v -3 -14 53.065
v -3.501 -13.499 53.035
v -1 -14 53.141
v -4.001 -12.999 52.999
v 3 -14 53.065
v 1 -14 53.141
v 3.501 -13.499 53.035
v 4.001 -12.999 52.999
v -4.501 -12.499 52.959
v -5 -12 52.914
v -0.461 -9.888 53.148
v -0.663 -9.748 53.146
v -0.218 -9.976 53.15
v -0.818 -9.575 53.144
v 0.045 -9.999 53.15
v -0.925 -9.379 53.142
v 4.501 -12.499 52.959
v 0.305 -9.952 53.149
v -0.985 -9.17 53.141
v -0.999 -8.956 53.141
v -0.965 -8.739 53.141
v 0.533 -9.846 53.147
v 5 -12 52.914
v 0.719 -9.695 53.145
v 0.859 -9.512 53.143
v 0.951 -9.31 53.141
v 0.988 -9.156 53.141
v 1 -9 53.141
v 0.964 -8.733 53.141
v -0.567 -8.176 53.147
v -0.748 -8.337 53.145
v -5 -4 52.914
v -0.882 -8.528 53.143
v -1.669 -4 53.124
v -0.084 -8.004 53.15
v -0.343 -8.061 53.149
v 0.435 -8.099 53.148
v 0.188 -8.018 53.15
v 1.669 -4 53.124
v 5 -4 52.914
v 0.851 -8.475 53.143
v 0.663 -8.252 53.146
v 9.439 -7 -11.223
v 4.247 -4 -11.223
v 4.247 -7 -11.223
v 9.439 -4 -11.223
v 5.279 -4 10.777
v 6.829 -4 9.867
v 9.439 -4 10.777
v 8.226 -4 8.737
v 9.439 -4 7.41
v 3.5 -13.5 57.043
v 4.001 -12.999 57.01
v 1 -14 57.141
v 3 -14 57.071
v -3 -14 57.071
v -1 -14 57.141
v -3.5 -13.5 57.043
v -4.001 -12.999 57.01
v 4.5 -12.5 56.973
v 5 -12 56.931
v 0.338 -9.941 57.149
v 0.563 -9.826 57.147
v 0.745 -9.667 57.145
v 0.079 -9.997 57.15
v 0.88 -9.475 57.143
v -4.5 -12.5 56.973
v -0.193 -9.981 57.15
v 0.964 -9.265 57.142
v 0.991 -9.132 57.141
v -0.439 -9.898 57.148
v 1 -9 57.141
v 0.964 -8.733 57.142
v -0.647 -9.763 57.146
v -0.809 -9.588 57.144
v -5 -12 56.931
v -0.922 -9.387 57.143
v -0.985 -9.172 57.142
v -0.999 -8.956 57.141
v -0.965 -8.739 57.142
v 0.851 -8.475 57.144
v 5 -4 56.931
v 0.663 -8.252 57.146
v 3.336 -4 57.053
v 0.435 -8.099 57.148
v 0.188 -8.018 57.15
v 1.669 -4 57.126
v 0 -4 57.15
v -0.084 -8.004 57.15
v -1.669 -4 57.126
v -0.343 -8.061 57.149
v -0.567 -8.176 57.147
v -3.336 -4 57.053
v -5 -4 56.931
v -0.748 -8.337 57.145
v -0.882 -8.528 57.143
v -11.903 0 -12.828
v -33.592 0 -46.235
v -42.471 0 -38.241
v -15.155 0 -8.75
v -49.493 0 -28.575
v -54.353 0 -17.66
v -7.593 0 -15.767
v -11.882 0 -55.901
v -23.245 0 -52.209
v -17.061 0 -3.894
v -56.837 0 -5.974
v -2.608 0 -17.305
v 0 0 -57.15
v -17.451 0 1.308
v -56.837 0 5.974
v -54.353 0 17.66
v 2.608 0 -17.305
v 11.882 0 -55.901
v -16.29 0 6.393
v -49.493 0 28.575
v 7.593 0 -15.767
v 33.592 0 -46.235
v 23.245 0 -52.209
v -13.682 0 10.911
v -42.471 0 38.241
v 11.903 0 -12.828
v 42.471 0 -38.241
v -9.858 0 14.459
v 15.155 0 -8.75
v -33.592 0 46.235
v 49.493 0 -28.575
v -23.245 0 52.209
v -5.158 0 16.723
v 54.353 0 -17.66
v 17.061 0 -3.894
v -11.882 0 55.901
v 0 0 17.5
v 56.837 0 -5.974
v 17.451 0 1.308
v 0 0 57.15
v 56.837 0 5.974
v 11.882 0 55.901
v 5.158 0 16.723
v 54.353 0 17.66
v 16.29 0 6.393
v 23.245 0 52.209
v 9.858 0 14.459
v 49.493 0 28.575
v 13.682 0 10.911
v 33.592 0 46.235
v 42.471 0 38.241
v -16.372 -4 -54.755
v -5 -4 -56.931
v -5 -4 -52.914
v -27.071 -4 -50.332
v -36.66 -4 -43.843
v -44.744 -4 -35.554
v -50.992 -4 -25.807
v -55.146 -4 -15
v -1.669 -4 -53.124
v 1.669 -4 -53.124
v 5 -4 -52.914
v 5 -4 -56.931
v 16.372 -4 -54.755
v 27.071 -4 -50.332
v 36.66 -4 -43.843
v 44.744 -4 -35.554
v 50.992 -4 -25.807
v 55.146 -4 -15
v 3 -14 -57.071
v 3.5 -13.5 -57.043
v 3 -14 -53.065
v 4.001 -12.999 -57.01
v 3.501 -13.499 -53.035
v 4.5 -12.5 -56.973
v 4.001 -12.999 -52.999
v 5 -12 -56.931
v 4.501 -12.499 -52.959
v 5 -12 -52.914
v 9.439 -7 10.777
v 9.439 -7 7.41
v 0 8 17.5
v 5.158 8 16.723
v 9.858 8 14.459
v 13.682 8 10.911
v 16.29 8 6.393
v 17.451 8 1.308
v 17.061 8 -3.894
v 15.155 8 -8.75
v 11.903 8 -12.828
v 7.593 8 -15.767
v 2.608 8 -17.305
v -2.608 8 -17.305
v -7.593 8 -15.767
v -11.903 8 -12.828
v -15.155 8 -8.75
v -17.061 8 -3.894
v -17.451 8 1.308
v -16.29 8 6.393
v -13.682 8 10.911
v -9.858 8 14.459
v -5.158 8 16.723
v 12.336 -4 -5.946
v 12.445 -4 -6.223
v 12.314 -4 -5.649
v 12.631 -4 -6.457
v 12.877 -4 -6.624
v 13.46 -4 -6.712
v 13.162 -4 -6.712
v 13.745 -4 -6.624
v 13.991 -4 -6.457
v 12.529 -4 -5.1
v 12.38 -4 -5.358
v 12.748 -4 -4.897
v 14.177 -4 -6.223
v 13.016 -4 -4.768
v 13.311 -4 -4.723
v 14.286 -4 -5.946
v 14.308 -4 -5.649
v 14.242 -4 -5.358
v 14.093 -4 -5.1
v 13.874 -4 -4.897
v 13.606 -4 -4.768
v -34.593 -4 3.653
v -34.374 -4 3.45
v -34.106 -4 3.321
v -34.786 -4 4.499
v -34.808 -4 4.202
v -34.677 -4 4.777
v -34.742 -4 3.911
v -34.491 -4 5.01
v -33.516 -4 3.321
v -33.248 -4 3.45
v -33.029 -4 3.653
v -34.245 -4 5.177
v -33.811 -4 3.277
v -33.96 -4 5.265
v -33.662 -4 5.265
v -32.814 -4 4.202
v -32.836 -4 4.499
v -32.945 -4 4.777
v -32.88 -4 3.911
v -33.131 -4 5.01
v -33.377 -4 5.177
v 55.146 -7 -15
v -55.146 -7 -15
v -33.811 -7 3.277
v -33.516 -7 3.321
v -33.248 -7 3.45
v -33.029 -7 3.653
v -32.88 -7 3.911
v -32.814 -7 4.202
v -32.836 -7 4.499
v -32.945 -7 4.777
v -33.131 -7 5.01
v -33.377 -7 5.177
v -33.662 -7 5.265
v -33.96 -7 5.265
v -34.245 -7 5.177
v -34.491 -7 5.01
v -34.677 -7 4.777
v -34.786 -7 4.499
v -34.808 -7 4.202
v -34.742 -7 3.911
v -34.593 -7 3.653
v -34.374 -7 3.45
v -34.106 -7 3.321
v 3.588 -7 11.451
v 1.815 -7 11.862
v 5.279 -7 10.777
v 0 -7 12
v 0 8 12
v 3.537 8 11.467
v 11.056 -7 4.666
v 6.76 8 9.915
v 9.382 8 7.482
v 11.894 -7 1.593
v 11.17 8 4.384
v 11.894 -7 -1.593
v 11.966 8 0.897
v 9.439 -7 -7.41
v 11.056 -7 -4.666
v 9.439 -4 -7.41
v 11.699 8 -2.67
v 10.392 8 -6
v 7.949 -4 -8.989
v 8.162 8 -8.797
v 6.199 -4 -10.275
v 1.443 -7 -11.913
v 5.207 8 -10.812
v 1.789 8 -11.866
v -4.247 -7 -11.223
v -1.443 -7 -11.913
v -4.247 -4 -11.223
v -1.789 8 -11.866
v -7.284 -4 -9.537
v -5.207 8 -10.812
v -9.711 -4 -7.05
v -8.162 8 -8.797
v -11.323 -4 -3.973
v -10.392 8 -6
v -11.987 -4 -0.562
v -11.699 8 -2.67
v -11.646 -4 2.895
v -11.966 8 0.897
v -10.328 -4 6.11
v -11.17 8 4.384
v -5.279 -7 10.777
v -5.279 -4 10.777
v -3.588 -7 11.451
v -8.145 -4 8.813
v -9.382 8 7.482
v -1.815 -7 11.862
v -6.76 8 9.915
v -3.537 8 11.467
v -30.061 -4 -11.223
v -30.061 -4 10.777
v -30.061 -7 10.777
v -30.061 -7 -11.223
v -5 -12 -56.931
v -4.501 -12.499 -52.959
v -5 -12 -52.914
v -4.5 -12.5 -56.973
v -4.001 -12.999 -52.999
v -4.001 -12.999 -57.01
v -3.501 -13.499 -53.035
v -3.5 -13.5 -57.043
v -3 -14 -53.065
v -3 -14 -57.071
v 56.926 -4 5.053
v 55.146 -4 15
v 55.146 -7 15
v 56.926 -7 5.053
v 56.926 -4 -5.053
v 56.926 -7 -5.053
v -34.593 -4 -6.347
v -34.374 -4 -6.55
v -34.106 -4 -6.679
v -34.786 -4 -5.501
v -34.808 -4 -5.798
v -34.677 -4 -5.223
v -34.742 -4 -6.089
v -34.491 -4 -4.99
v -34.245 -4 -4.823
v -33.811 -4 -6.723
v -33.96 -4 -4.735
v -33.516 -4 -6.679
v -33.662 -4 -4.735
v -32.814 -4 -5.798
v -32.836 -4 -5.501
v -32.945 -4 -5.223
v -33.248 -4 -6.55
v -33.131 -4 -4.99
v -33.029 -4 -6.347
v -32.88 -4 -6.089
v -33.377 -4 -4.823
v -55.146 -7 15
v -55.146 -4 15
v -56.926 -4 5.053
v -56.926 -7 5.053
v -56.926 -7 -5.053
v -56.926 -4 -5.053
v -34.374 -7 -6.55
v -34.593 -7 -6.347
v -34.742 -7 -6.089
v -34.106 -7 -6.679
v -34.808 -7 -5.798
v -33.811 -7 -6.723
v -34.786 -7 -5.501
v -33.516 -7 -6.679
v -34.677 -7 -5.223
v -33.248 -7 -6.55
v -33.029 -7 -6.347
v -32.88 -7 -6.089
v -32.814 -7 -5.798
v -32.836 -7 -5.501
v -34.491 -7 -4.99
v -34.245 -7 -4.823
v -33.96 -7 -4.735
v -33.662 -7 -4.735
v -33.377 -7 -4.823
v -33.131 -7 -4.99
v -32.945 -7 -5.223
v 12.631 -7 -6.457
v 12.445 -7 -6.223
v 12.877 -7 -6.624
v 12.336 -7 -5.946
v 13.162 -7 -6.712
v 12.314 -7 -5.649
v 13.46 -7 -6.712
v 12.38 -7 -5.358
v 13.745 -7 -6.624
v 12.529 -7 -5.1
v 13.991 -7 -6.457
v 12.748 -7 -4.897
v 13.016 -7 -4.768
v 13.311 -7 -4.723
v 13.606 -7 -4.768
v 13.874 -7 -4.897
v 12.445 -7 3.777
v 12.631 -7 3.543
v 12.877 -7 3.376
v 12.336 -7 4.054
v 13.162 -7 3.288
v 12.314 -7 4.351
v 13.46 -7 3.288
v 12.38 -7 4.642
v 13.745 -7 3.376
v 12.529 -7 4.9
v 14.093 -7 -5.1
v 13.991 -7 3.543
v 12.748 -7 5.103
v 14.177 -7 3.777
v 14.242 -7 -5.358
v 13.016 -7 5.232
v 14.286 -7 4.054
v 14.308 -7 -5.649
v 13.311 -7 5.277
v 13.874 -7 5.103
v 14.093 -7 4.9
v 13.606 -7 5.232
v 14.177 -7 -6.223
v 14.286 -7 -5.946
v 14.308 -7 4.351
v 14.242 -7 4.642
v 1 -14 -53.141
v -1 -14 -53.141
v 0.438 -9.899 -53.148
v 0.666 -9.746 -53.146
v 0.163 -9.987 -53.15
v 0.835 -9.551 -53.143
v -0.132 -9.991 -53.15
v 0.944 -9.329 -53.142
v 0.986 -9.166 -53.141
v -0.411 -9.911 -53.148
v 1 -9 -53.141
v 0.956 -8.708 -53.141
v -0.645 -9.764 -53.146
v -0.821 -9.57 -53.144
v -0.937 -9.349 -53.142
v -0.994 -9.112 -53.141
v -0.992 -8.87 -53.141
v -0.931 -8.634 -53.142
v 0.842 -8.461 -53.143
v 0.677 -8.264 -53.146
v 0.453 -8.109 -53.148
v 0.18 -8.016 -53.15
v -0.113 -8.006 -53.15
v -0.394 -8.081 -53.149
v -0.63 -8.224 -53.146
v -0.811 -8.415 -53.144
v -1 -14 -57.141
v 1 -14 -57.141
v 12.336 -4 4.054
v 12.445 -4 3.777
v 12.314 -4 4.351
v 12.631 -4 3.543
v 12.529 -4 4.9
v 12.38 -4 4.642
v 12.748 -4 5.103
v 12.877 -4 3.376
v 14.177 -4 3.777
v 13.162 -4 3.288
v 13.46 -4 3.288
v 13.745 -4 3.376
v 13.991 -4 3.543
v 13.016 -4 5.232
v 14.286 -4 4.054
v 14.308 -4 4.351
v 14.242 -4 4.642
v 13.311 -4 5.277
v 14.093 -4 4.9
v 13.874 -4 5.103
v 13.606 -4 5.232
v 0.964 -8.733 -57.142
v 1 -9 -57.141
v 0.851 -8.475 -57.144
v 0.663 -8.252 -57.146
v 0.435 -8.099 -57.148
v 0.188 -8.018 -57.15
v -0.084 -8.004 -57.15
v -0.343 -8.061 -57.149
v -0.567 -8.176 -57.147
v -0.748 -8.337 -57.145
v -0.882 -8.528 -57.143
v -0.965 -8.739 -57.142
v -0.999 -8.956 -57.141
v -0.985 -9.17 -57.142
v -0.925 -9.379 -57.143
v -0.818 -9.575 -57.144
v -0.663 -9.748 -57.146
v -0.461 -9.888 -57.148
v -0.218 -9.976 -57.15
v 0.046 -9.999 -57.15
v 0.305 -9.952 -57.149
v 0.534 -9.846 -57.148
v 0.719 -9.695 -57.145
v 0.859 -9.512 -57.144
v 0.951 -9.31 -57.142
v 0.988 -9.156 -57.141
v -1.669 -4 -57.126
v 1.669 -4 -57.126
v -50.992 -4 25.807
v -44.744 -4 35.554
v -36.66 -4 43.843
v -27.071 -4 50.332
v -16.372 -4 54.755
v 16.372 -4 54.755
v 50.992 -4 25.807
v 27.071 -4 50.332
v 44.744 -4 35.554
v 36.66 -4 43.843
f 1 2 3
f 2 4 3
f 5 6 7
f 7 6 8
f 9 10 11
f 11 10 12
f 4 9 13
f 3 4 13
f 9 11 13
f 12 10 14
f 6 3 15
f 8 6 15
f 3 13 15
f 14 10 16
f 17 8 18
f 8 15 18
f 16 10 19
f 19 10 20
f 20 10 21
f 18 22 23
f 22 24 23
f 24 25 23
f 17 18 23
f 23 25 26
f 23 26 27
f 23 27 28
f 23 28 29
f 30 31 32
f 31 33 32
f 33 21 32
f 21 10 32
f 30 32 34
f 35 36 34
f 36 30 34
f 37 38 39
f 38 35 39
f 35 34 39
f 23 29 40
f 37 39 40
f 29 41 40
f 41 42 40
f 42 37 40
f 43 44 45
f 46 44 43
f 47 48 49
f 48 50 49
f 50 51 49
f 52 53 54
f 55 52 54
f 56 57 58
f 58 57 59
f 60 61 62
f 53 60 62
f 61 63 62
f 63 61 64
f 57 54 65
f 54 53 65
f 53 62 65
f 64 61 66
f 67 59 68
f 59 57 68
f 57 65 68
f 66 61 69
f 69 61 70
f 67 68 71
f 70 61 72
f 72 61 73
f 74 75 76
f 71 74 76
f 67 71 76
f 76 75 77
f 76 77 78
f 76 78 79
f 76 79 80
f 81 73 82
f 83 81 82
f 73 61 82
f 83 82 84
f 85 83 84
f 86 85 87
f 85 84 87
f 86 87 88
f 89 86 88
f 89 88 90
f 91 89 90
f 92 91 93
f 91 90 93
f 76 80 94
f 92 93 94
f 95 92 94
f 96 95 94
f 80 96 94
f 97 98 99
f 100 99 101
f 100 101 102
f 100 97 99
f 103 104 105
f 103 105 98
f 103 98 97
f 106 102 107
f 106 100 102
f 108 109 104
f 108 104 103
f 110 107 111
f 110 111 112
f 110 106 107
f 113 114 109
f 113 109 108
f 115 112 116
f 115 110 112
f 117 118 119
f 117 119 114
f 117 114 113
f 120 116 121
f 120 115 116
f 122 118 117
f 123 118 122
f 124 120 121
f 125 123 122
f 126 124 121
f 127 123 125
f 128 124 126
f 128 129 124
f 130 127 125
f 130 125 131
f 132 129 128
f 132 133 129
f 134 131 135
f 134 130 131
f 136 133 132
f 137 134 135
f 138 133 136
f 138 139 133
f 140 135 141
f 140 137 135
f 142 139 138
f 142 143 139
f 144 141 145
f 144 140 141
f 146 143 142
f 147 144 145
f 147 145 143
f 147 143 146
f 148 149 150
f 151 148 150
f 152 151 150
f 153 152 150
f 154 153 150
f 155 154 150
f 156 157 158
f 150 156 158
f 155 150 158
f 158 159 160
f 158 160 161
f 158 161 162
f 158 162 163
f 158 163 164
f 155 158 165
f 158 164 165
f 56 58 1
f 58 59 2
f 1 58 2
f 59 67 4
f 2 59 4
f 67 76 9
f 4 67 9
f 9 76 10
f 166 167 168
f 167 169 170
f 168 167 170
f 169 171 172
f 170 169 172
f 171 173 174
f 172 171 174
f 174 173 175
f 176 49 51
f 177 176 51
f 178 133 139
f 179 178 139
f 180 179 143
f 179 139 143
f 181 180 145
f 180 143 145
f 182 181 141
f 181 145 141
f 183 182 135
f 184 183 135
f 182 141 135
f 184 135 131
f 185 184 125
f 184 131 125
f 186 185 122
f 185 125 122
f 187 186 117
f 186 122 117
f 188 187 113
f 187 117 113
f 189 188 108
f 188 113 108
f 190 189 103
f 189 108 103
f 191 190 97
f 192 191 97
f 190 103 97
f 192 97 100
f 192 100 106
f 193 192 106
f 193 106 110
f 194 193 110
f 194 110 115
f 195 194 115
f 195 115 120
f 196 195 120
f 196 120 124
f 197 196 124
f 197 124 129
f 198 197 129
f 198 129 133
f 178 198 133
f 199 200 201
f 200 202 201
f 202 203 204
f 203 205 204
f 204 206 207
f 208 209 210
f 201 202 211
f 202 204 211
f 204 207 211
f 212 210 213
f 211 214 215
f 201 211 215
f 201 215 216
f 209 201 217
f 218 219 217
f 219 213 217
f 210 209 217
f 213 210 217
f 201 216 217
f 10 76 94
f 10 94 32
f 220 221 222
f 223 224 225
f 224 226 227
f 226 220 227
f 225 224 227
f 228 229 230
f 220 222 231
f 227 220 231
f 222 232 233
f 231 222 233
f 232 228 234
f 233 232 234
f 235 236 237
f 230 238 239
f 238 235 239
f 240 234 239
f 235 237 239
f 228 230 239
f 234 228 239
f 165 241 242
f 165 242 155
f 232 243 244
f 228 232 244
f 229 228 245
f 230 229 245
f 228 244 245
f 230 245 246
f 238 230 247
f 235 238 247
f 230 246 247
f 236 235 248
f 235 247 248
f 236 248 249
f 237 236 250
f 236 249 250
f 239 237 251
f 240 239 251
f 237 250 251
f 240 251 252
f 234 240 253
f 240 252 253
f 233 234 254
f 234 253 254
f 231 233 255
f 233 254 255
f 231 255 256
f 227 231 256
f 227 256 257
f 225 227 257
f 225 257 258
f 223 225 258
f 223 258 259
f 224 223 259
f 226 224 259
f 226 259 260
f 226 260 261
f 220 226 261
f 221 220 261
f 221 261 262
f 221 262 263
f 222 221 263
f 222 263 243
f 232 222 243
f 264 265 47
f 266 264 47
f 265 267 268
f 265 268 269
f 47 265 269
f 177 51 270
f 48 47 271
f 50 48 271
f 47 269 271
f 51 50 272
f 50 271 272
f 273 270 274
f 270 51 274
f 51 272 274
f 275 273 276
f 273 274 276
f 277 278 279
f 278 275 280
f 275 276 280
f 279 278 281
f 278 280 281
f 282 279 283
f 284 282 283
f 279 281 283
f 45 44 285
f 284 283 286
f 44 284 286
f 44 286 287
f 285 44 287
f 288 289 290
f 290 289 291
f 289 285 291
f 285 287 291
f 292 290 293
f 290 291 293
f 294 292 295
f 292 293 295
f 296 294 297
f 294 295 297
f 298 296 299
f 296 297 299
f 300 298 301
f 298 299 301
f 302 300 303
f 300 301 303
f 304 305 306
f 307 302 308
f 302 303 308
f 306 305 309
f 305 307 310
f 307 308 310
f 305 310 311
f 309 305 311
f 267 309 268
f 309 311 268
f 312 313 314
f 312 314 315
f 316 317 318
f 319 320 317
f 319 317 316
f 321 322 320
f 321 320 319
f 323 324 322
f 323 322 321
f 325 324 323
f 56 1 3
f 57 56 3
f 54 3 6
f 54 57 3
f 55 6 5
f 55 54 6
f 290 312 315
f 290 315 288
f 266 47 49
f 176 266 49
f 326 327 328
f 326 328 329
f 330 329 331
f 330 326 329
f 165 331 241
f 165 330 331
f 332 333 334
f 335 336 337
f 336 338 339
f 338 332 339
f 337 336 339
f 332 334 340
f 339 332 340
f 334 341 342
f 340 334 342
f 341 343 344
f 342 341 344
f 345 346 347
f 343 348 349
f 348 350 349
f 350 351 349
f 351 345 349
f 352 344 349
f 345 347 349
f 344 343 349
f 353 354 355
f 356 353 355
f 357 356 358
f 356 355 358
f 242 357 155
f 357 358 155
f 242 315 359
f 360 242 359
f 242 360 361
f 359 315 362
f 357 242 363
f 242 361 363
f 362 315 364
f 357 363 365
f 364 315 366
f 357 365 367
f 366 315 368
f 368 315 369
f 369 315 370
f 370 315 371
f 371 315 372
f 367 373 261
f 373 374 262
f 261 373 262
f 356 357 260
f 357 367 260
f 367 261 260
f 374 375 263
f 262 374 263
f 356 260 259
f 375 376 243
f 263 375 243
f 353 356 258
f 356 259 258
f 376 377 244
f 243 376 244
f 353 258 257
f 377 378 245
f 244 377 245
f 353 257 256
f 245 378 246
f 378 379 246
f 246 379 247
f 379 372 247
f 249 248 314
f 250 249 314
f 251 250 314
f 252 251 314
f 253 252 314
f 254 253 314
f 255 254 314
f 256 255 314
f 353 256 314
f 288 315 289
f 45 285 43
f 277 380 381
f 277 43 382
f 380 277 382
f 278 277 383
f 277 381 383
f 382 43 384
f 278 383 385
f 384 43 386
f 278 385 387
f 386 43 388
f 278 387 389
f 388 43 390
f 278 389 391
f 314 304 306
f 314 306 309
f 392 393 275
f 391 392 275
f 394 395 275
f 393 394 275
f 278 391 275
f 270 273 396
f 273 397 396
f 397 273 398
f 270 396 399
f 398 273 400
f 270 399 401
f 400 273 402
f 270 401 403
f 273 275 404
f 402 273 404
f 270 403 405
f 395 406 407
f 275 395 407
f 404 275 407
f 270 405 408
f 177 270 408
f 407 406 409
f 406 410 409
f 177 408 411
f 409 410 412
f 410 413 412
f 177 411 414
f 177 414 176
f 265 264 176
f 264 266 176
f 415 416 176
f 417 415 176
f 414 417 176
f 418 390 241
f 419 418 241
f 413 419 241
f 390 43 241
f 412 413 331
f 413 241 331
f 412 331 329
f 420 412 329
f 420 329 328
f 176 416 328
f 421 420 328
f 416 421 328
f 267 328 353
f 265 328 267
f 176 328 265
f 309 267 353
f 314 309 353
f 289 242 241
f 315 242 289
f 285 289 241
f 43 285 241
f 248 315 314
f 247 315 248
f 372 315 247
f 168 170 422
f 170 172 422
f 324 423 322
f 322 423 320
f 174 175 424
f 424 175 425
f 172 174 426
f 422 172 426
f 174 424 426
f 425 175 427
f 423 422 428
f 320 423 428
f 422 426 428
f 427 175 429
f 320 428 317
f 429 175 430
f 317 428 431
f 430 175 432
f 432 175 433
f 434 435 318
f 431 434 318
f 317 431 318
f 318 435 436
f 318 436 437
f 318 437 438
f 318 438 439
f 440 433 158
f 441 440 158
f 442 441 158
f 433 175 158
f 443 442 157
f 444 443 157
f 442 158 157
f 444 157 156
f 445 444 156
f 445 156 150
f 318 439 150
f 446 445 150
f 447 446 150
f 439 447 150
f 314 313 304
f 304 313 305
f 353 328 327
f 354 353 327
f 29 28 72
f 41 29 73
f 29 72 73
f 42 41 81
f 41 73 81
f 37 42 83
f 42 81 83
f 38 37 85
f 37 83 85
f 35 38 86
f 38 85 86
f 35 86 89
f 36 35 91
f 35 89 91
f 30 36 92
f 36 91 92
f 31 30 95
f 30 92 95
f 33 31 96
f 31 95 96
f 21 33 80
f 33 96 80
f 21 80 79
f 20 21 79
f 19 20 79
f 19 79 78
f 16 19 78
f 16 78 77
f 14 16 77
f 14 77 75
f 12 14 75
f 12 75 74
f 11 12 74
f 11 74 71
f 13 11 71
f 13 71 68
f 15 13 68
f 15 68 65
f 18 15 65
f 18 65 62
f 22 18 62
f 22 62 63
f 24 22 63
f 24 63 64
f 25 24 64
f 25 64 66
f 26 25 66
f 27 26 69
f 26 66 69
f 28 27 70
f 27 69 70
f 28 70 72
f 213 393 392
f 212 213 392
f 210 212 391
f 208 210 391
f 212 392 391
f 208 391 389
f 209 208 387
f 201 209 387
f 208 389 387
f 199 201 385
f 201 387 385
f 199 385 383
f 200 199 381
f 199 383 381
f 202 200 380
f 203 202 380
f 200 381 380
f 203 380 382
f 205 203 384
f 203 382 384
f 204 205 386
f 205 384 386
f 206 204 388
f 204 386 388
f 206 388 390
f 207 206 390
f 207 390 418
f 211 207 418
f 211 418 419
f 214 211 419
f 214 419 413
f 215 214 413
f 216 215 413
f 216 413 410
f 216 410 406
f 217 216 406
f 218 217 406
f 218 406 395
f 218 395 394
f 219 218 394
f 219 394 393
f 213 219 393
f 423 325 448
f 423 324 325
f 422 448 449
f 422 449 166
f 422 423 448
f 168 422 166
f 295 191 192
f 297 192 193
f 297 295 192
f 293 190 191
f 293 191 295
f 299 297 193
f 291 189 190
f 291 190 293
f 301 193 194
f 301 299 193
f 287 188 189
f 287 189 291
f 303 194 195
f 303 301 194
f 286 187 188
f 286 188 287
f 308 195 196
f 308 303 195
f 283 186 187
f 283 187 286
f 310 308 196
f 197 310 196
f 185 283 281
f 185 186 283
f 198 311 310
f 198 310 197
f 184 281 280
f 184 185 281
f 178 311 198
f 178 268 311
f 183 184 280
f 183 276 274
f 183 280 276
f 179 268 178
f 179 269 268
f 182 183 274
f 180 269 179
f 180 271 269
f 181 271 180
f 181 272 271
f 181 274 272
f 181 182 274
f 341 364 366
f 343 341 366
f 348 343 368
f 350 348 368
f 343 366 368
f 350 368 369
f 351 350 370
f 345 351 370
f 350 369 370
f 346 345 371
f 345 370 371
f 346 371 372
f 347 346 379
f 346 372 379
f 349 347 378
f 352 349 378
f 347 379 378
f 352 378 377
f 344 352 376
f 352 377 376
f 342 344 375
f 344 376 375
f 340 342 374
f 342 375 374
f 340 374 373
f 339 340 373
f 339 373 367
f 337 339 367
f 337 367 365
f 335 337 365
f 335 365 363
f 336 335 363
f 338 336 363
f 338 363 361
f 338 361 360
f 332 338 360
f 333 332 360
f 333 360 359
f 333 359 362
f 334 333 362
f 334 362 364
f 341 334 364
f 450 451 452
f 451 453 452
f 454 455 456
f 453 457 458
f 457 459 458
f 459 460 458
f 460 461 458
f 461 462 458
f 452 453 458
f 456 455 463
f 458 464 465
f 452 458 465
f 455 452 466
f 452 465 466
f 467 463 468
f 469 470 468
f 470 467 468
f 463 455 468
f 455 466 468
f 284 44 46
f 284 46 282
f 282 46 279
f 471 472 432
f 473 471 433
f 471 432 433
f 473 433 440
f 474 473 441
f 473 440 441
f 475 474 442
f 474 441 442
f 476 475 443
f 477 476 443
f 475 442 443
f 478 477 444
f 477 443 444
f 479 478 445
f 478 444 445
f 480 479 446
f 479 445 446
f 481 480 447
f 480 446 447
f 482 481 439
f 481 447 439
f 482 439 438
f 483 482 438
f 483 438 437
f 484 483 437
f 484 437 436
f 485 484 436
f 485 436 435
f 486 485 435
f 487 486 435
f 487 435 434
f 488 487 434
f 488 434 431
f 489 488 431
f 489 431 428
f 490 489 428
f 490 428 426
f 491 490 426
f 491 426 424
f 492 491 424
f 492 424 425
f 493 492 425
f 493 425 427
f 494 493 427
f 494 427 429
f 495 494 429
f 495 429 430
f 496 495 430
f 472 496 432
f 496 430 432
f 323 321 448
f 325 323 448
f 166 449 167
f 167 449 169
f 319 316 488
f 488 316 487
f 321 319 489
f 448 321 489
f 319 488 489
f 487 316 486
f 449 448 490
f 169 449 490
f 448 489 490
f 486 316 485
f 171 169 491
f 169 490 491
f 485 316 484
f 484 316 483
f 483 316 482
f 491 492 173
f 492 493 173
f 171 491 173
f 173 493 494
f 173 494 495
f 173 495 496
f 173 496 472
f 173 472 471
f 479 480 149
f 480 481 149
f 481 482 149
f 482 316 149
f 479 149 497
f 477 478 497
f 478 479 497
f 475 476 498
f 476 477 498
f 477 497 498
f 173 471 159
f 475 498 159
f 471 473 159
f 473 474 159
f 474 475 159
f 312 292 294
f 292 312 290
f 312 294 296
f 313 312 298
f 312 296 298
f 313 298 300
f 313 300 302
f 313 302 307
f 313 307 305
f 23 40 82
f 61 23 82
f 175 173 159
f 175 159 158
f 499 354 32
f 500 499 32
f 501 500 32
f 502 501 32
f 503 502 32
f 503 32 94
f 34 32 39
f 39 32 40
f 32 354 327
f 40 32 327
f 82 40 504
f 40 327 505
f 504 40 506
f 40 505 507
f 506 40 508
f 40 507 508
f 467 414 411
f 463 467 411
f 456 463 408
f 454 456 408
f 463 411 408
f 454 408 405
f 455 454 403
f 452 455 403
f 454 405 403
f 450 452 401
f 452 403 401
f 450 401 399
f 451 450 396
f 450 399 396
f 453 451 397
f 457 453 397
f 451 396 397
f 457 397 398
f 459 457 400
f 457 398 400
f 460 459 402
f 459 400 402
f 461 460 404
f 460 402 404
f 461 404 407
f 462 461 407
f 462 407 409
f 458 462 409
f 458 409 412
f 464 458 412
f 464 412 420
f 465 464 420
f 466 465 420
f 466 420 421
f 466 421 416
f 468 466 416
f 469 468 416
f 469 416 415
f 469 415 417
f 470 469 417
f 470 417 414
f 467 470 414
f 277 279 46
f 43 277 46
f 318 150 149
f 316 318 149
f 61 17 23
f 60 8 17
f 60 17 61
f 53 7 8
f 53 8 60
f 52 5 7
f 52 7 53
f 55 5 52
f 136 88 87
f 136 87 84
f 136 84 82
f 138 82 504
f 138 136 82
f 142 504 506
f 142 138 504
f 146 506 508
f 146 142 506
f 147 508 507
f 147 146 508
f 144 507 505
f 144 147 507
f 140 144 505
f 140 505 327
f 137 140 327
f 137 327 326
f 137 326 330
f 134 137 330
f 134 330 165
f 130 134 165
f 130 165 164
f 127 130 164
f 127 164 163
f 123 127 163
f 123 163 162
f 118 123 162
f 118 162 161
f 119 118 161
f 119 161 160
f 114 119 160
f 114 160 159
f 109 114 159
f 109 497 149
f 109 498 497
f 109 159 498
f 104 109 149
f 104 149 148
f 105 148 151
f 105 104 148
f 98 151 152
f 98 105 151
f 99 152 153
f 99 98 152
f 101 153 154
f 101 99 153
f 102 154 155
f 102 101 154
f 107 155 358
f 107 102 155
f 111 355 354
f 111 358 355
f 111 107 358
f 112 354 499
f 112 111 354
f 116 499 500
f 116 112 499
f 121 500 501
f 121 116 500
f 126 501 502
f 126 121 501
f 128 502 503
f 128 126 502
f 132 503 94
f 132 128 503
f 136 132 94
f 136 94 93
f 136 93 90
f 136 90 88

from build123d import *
from build123d.topology import SkipClean

# Parameters (mm, degrees)
SKETCH2_R               = 17.5
BOSS_EXTRUDE3_DEPTH     = 8
CUT_EXTRUDE3_DEPTH      = 8
CUT_EXTRUDE3_DEPTH_BACK = 10
SKETCH10_R              = 12
SKETCH11_W              = 54.5
SKETCH11_H              = 30
BOSS_EXTRUDE7_DEPTH     = 7
SKETCH12_W              = 39.5
SKETCH12_H              = 22
CUT_EXTRUDE4_DEPTH      = 43.148546831
SKETCH18_R              = 65
CUT_EXTRUDE6_DEPTH      = 4
SKETCH24_R              = 1
CUT_EXTRUDE7_DEPTH      = 4
SKETCH33_R              = 57.15
BOSS_EXTRUDE8_DEPTH     = 4
SKETCH34_R              = 12
CUT_EXTRUDE8_DEPTH      = 7
BOSS_EXTRUDE13_DEPTH    = 10
F_1_0MM_DOWEL_HOLE1_D   = 2
BOSS_EXTRUDE14_DEPTH    = 3
BOSS_EXTRUDE15_REACH    = 96.659
SKETCH21_W              = 30
SKETCH21_H              = 3
BOSS_EXTRUDE16_REACH    = 113.448
SKETCH31_W              = 30
SKETCH31_H              = 3
CHAMFER1_SIZE           = 2


with BuildPart() as part:
    # Sketch2 → Boss-Extrude3 (new body)
    with BuildSketch(Plane(origin=(0, 0, 0), x_dir=(1, 0, 0), z_dir=(0, 1, 0))):
        with Locations(Location((0, 0, 0), (0, 0, 270))):
            Circle(SKETCH2_R)
    extrude(amount=BOSS_EXTRUDE3_DEPTH)

    # Sketch10 → Cut-Extrude3 (cut, two sides: drawn at the far end of the back side and taken through both)
    with BuildSketch(Plane(origin=(0, 0, 0), x_dir=(1, 0, 0), z_dir=(0, 1, 0)).offset(-CUT_EXTRUDE3_DEPTH_BACK)):
        with Locations(Location((0, 0, 0), (0, 0, 270))):
            Circle(SKETCH10_R)
    extrude(amount=CUT_EXTRUDE3_DEPTH + CUT_EXTRUDE3_DEPTH_BACK, mode=Mode.SUBTRACT)

    # Sketch11 → Boss-Extrude7 (add)
    with BuildSketch(Plane(origin=(0, 0, 0), x_dir=(1, 0, 0), z_dir=(0, 1, 0))):
        with Locations((-10.25, 0)):
            Rectangle(SKETCH11_W, SKETCH11_H)
    extrude(amount=-BOSS_EXTRUDE7_DEPTH)

    # Sketch12 → Cut-Extrude4 (cut, through all)
    with BuildSketch(Plane(origin=(0, 0, 0), x_dir=(1, 0, 0), z_dir=(0, 1, 0))):
        with Locations((-10.311158619, 0.223490858)):
            Rectangle(SKETCH12_W, SKETCH12_H)
    extrude(amount=-CUT_EXTRUDE4_DEPTH, mode=Mode.SUBTRACT)

    # Sketch18 → Cut-Extrude6 (cut)
    with BuildSketch(Plane(origin=(0, 0, 0), x_dir=(1, 0, 0), z_dir=(0, 1, 0))):
        Circle(SKETCH18_R)
    extrude(amount=-CUT_EXTRUDE6_DEPTH, mode=Mode.SUBTRACT)


with BuildPart() as cut_extrude6_piece_1:
    # of the separate pieces the step leaves, piece 1, a body of its own (cut_extrude6_pieces)
    add(part.part.solids().sort_by_distance((0, 0, 17.5))[0])



with BuildPart() as cut_extrude6_piece_2:
    # of the separate pieces the step leaves, piece 2, a body of its own (cut_extrude6_pieces)
    add(part.part.solids().sort_by_distance((-37.5, -4, 15))[0])

    # Sketch24 → Cut-Extrude7 (cut)
    with BuildSketch(Plane.XZ.offset(7)):
        with Locations(Location((-33.811158619, 4.276509142, 0), (0, 0, 270))):
            Circle(SKETCH24_R)
        with Locations(Location((-33.811158619, -5.723490858, 0), (0, 0, 270))):
            Circle(SKETCH24_R)
        with Locations(Location((13.311158619, -5.723490858, 0), (0, 0, 90))):
            Circle(SKETCH24_R)
        with Locations(Location((13.311158619, 4.276509142, 0), (0, 0, 90))):
            Circle(SKETCH24_R)
    extrude(amount=-CUT_EXTRUDE7_DEPTH, mode=Mode.SUBTRACT)


with BuildPart() as cut_extrude6_piece_1_1:
    add(cut_extrude6_piece_1.part)

    add(cut_extrude6_piece_2.part)  # Boss-Extrude8 merges Cut-Extrude6 piece 2
    # Sketch33 → Boss-Extrude8 (add)
    with BuildSketch(Plane(origin=(0, 0, 0), x_dir=(1, 0, 0), z_dir=(0, 1, 0))):
        with Locations(Location((0, 0, 0), (0, 0, 270))):
            Circle(SKETCH33_R)
    extrude(amount=-BOSS_EXTRUDE8_DEPTH)

    # Sketch34 → Cut-Extrude8 (cut)
    with BuildSketch(Plane(origin=(0, 0, 0), x_dir=(1, 0, 0), z_dir=(0, 1, 0))):
        with Locations(Location((0, 0, 0), (0, 0, 270))):
            Circle(SKETCH34_R)
    extrude(amount=-CUT_EXTRUDE8_DEPTH, mode=Mode.SUBTRACT)

    # Sketch37 → Boss-Extrude13 (add)
    with SkipClean():  # the faces are left unmerged after this step: merging them gives an invalid solid
        with BuildSketch(Plane.XZ.offset(4)):
            with BuildLine():
                Line((-5, -52.91429391), (-5, -56.930857187))
                ThreePointArc((-5, -56.930857187), (0, -57.15), (5, -56.930857187))
                Line((5, -56.930857187), (5, -52.91429391))
                ThreePointArc((5, -52.91429391), (0, -53.15), (-5, -52.91429391))
            make_face()
            with BuildLine():
                Line((-5, 56.930857187), (-5, 52.91429391))
                ThreePointArc((-5, 52.91429391), (0, 53.15), (5, 52.91429391))
                Line((5, 52.91429391), (5, 56.930857187))
                ThreePointArc((5, 56.930857187), (0, 57.15), (-5, 56.930857187))
            make_face()
        extrude(amount=BOSS_EXTRUDE13_DEPTH)

    # Ø1.0mm Dowel Hole1 (through all)
    with Locations(Plane(origin=(0, -9, -57.15), x_dir=(-1, 0, 0), z_dir=(0, 0, -1))):
        with Locations((0, 0)):
            Hole(F_1_0MM_DOWEL_HOLE1_D / 2)

    # Sketch86 → Boss-Extrude14 (add)
    with SkipClean():  # the faces are left unmerged after this step: merging them gives an invalid solid
        with BuildSketch(Plane(origin=(0, -4, 0), x_dir=(-1, 0, 0), z_dir=(0, -1, 0))):
            with BuildLine():
                Line((-51.119442268, -15), (-55.146373408, -15))
                ThreePointArc((-55.146373408, -15), (-57.15, 0), (-55.146373408, 15))
                Line((-55.146373408, 15), (-51.119442268, 15))
                ThreePointArc((-51.119442268, 15), (-53.274734892, 0), (-51.119442268, -15))
            make_face()
            with BuildLine():
                Line((51.119442268, -15), (55.146373408, -15))
                ThreePointArc((55.146373408, -15), (57.15, 0), (55.146373408, 15))
                Line((55.146373408, 15), (51.119442268, 15))
                ThreePointArc((51.119442268, 15), (53.274734892, 0), (51.119442268, -15))
            make_face()
        extrude(amount=BOSS_EXTRUDE14_DEPTH)

    # Sketch21 → Boss-Extrude15 (add, up to next)
    with BuildSketch(Plane(origin=(17, 0, 0), x_dir=(0, 0, -1), z_dir=(1, 0, 0)), mode=Mode.PRIVATE) as boss_extrude15_sk1:
        with Locations((0, -5.5)):
            Rectangle(SKETCH21_W, SKETCH21_H)
    boss_extrude15_tool1 = extrude(boss_extrude15_sk1.sketch, amount=BOSS_EXTRUDE15_REACH, mode=Mode.PRIVATE) - cut_extrude6_piece_1_1.part
    add(boss_extrude15_tool1.solids().sort_by_distance((17, -5.5, 0))[0])

    # Sketch31 → Boss-Extrude16 (add, up to next)
    with BuildSketch(Plane.ZY.offset(37.5), mode=Mode.PRIVATE) as boss_extrude16_sk1:
        with Locations((0, -5.5)):
            Rectangle(SKETCH31_W, SKETCH31_H)
    boss_extrude16_tool1 = extrude(boss_extrude16_sk1.sketch, amount=BOSS_EXTRUDE16_REACH, mode=Mode.PRIVATE) - cut_extrude6_piece_1_1.part
    add(boss_extrude16_tool1.solids().sort_by_distance((-37.5, -5.5, 0))[0])

    # Chamfer1
    chamfer1_edges = [cut_extrude6_piece_1_1.edges().sort_by_distance(p)[0] for p in [
        (5, -14, -54.922575548),
        (-5, -14, -54.922575548),
        (-5, -14, 54.922575548),
        (5, -14, 54.922575548),
    ]]
    chamfer(chamfer1_edges, length=CHAMFER1_SIZE)


solid = cut_extrude6_piece_1_1.part
